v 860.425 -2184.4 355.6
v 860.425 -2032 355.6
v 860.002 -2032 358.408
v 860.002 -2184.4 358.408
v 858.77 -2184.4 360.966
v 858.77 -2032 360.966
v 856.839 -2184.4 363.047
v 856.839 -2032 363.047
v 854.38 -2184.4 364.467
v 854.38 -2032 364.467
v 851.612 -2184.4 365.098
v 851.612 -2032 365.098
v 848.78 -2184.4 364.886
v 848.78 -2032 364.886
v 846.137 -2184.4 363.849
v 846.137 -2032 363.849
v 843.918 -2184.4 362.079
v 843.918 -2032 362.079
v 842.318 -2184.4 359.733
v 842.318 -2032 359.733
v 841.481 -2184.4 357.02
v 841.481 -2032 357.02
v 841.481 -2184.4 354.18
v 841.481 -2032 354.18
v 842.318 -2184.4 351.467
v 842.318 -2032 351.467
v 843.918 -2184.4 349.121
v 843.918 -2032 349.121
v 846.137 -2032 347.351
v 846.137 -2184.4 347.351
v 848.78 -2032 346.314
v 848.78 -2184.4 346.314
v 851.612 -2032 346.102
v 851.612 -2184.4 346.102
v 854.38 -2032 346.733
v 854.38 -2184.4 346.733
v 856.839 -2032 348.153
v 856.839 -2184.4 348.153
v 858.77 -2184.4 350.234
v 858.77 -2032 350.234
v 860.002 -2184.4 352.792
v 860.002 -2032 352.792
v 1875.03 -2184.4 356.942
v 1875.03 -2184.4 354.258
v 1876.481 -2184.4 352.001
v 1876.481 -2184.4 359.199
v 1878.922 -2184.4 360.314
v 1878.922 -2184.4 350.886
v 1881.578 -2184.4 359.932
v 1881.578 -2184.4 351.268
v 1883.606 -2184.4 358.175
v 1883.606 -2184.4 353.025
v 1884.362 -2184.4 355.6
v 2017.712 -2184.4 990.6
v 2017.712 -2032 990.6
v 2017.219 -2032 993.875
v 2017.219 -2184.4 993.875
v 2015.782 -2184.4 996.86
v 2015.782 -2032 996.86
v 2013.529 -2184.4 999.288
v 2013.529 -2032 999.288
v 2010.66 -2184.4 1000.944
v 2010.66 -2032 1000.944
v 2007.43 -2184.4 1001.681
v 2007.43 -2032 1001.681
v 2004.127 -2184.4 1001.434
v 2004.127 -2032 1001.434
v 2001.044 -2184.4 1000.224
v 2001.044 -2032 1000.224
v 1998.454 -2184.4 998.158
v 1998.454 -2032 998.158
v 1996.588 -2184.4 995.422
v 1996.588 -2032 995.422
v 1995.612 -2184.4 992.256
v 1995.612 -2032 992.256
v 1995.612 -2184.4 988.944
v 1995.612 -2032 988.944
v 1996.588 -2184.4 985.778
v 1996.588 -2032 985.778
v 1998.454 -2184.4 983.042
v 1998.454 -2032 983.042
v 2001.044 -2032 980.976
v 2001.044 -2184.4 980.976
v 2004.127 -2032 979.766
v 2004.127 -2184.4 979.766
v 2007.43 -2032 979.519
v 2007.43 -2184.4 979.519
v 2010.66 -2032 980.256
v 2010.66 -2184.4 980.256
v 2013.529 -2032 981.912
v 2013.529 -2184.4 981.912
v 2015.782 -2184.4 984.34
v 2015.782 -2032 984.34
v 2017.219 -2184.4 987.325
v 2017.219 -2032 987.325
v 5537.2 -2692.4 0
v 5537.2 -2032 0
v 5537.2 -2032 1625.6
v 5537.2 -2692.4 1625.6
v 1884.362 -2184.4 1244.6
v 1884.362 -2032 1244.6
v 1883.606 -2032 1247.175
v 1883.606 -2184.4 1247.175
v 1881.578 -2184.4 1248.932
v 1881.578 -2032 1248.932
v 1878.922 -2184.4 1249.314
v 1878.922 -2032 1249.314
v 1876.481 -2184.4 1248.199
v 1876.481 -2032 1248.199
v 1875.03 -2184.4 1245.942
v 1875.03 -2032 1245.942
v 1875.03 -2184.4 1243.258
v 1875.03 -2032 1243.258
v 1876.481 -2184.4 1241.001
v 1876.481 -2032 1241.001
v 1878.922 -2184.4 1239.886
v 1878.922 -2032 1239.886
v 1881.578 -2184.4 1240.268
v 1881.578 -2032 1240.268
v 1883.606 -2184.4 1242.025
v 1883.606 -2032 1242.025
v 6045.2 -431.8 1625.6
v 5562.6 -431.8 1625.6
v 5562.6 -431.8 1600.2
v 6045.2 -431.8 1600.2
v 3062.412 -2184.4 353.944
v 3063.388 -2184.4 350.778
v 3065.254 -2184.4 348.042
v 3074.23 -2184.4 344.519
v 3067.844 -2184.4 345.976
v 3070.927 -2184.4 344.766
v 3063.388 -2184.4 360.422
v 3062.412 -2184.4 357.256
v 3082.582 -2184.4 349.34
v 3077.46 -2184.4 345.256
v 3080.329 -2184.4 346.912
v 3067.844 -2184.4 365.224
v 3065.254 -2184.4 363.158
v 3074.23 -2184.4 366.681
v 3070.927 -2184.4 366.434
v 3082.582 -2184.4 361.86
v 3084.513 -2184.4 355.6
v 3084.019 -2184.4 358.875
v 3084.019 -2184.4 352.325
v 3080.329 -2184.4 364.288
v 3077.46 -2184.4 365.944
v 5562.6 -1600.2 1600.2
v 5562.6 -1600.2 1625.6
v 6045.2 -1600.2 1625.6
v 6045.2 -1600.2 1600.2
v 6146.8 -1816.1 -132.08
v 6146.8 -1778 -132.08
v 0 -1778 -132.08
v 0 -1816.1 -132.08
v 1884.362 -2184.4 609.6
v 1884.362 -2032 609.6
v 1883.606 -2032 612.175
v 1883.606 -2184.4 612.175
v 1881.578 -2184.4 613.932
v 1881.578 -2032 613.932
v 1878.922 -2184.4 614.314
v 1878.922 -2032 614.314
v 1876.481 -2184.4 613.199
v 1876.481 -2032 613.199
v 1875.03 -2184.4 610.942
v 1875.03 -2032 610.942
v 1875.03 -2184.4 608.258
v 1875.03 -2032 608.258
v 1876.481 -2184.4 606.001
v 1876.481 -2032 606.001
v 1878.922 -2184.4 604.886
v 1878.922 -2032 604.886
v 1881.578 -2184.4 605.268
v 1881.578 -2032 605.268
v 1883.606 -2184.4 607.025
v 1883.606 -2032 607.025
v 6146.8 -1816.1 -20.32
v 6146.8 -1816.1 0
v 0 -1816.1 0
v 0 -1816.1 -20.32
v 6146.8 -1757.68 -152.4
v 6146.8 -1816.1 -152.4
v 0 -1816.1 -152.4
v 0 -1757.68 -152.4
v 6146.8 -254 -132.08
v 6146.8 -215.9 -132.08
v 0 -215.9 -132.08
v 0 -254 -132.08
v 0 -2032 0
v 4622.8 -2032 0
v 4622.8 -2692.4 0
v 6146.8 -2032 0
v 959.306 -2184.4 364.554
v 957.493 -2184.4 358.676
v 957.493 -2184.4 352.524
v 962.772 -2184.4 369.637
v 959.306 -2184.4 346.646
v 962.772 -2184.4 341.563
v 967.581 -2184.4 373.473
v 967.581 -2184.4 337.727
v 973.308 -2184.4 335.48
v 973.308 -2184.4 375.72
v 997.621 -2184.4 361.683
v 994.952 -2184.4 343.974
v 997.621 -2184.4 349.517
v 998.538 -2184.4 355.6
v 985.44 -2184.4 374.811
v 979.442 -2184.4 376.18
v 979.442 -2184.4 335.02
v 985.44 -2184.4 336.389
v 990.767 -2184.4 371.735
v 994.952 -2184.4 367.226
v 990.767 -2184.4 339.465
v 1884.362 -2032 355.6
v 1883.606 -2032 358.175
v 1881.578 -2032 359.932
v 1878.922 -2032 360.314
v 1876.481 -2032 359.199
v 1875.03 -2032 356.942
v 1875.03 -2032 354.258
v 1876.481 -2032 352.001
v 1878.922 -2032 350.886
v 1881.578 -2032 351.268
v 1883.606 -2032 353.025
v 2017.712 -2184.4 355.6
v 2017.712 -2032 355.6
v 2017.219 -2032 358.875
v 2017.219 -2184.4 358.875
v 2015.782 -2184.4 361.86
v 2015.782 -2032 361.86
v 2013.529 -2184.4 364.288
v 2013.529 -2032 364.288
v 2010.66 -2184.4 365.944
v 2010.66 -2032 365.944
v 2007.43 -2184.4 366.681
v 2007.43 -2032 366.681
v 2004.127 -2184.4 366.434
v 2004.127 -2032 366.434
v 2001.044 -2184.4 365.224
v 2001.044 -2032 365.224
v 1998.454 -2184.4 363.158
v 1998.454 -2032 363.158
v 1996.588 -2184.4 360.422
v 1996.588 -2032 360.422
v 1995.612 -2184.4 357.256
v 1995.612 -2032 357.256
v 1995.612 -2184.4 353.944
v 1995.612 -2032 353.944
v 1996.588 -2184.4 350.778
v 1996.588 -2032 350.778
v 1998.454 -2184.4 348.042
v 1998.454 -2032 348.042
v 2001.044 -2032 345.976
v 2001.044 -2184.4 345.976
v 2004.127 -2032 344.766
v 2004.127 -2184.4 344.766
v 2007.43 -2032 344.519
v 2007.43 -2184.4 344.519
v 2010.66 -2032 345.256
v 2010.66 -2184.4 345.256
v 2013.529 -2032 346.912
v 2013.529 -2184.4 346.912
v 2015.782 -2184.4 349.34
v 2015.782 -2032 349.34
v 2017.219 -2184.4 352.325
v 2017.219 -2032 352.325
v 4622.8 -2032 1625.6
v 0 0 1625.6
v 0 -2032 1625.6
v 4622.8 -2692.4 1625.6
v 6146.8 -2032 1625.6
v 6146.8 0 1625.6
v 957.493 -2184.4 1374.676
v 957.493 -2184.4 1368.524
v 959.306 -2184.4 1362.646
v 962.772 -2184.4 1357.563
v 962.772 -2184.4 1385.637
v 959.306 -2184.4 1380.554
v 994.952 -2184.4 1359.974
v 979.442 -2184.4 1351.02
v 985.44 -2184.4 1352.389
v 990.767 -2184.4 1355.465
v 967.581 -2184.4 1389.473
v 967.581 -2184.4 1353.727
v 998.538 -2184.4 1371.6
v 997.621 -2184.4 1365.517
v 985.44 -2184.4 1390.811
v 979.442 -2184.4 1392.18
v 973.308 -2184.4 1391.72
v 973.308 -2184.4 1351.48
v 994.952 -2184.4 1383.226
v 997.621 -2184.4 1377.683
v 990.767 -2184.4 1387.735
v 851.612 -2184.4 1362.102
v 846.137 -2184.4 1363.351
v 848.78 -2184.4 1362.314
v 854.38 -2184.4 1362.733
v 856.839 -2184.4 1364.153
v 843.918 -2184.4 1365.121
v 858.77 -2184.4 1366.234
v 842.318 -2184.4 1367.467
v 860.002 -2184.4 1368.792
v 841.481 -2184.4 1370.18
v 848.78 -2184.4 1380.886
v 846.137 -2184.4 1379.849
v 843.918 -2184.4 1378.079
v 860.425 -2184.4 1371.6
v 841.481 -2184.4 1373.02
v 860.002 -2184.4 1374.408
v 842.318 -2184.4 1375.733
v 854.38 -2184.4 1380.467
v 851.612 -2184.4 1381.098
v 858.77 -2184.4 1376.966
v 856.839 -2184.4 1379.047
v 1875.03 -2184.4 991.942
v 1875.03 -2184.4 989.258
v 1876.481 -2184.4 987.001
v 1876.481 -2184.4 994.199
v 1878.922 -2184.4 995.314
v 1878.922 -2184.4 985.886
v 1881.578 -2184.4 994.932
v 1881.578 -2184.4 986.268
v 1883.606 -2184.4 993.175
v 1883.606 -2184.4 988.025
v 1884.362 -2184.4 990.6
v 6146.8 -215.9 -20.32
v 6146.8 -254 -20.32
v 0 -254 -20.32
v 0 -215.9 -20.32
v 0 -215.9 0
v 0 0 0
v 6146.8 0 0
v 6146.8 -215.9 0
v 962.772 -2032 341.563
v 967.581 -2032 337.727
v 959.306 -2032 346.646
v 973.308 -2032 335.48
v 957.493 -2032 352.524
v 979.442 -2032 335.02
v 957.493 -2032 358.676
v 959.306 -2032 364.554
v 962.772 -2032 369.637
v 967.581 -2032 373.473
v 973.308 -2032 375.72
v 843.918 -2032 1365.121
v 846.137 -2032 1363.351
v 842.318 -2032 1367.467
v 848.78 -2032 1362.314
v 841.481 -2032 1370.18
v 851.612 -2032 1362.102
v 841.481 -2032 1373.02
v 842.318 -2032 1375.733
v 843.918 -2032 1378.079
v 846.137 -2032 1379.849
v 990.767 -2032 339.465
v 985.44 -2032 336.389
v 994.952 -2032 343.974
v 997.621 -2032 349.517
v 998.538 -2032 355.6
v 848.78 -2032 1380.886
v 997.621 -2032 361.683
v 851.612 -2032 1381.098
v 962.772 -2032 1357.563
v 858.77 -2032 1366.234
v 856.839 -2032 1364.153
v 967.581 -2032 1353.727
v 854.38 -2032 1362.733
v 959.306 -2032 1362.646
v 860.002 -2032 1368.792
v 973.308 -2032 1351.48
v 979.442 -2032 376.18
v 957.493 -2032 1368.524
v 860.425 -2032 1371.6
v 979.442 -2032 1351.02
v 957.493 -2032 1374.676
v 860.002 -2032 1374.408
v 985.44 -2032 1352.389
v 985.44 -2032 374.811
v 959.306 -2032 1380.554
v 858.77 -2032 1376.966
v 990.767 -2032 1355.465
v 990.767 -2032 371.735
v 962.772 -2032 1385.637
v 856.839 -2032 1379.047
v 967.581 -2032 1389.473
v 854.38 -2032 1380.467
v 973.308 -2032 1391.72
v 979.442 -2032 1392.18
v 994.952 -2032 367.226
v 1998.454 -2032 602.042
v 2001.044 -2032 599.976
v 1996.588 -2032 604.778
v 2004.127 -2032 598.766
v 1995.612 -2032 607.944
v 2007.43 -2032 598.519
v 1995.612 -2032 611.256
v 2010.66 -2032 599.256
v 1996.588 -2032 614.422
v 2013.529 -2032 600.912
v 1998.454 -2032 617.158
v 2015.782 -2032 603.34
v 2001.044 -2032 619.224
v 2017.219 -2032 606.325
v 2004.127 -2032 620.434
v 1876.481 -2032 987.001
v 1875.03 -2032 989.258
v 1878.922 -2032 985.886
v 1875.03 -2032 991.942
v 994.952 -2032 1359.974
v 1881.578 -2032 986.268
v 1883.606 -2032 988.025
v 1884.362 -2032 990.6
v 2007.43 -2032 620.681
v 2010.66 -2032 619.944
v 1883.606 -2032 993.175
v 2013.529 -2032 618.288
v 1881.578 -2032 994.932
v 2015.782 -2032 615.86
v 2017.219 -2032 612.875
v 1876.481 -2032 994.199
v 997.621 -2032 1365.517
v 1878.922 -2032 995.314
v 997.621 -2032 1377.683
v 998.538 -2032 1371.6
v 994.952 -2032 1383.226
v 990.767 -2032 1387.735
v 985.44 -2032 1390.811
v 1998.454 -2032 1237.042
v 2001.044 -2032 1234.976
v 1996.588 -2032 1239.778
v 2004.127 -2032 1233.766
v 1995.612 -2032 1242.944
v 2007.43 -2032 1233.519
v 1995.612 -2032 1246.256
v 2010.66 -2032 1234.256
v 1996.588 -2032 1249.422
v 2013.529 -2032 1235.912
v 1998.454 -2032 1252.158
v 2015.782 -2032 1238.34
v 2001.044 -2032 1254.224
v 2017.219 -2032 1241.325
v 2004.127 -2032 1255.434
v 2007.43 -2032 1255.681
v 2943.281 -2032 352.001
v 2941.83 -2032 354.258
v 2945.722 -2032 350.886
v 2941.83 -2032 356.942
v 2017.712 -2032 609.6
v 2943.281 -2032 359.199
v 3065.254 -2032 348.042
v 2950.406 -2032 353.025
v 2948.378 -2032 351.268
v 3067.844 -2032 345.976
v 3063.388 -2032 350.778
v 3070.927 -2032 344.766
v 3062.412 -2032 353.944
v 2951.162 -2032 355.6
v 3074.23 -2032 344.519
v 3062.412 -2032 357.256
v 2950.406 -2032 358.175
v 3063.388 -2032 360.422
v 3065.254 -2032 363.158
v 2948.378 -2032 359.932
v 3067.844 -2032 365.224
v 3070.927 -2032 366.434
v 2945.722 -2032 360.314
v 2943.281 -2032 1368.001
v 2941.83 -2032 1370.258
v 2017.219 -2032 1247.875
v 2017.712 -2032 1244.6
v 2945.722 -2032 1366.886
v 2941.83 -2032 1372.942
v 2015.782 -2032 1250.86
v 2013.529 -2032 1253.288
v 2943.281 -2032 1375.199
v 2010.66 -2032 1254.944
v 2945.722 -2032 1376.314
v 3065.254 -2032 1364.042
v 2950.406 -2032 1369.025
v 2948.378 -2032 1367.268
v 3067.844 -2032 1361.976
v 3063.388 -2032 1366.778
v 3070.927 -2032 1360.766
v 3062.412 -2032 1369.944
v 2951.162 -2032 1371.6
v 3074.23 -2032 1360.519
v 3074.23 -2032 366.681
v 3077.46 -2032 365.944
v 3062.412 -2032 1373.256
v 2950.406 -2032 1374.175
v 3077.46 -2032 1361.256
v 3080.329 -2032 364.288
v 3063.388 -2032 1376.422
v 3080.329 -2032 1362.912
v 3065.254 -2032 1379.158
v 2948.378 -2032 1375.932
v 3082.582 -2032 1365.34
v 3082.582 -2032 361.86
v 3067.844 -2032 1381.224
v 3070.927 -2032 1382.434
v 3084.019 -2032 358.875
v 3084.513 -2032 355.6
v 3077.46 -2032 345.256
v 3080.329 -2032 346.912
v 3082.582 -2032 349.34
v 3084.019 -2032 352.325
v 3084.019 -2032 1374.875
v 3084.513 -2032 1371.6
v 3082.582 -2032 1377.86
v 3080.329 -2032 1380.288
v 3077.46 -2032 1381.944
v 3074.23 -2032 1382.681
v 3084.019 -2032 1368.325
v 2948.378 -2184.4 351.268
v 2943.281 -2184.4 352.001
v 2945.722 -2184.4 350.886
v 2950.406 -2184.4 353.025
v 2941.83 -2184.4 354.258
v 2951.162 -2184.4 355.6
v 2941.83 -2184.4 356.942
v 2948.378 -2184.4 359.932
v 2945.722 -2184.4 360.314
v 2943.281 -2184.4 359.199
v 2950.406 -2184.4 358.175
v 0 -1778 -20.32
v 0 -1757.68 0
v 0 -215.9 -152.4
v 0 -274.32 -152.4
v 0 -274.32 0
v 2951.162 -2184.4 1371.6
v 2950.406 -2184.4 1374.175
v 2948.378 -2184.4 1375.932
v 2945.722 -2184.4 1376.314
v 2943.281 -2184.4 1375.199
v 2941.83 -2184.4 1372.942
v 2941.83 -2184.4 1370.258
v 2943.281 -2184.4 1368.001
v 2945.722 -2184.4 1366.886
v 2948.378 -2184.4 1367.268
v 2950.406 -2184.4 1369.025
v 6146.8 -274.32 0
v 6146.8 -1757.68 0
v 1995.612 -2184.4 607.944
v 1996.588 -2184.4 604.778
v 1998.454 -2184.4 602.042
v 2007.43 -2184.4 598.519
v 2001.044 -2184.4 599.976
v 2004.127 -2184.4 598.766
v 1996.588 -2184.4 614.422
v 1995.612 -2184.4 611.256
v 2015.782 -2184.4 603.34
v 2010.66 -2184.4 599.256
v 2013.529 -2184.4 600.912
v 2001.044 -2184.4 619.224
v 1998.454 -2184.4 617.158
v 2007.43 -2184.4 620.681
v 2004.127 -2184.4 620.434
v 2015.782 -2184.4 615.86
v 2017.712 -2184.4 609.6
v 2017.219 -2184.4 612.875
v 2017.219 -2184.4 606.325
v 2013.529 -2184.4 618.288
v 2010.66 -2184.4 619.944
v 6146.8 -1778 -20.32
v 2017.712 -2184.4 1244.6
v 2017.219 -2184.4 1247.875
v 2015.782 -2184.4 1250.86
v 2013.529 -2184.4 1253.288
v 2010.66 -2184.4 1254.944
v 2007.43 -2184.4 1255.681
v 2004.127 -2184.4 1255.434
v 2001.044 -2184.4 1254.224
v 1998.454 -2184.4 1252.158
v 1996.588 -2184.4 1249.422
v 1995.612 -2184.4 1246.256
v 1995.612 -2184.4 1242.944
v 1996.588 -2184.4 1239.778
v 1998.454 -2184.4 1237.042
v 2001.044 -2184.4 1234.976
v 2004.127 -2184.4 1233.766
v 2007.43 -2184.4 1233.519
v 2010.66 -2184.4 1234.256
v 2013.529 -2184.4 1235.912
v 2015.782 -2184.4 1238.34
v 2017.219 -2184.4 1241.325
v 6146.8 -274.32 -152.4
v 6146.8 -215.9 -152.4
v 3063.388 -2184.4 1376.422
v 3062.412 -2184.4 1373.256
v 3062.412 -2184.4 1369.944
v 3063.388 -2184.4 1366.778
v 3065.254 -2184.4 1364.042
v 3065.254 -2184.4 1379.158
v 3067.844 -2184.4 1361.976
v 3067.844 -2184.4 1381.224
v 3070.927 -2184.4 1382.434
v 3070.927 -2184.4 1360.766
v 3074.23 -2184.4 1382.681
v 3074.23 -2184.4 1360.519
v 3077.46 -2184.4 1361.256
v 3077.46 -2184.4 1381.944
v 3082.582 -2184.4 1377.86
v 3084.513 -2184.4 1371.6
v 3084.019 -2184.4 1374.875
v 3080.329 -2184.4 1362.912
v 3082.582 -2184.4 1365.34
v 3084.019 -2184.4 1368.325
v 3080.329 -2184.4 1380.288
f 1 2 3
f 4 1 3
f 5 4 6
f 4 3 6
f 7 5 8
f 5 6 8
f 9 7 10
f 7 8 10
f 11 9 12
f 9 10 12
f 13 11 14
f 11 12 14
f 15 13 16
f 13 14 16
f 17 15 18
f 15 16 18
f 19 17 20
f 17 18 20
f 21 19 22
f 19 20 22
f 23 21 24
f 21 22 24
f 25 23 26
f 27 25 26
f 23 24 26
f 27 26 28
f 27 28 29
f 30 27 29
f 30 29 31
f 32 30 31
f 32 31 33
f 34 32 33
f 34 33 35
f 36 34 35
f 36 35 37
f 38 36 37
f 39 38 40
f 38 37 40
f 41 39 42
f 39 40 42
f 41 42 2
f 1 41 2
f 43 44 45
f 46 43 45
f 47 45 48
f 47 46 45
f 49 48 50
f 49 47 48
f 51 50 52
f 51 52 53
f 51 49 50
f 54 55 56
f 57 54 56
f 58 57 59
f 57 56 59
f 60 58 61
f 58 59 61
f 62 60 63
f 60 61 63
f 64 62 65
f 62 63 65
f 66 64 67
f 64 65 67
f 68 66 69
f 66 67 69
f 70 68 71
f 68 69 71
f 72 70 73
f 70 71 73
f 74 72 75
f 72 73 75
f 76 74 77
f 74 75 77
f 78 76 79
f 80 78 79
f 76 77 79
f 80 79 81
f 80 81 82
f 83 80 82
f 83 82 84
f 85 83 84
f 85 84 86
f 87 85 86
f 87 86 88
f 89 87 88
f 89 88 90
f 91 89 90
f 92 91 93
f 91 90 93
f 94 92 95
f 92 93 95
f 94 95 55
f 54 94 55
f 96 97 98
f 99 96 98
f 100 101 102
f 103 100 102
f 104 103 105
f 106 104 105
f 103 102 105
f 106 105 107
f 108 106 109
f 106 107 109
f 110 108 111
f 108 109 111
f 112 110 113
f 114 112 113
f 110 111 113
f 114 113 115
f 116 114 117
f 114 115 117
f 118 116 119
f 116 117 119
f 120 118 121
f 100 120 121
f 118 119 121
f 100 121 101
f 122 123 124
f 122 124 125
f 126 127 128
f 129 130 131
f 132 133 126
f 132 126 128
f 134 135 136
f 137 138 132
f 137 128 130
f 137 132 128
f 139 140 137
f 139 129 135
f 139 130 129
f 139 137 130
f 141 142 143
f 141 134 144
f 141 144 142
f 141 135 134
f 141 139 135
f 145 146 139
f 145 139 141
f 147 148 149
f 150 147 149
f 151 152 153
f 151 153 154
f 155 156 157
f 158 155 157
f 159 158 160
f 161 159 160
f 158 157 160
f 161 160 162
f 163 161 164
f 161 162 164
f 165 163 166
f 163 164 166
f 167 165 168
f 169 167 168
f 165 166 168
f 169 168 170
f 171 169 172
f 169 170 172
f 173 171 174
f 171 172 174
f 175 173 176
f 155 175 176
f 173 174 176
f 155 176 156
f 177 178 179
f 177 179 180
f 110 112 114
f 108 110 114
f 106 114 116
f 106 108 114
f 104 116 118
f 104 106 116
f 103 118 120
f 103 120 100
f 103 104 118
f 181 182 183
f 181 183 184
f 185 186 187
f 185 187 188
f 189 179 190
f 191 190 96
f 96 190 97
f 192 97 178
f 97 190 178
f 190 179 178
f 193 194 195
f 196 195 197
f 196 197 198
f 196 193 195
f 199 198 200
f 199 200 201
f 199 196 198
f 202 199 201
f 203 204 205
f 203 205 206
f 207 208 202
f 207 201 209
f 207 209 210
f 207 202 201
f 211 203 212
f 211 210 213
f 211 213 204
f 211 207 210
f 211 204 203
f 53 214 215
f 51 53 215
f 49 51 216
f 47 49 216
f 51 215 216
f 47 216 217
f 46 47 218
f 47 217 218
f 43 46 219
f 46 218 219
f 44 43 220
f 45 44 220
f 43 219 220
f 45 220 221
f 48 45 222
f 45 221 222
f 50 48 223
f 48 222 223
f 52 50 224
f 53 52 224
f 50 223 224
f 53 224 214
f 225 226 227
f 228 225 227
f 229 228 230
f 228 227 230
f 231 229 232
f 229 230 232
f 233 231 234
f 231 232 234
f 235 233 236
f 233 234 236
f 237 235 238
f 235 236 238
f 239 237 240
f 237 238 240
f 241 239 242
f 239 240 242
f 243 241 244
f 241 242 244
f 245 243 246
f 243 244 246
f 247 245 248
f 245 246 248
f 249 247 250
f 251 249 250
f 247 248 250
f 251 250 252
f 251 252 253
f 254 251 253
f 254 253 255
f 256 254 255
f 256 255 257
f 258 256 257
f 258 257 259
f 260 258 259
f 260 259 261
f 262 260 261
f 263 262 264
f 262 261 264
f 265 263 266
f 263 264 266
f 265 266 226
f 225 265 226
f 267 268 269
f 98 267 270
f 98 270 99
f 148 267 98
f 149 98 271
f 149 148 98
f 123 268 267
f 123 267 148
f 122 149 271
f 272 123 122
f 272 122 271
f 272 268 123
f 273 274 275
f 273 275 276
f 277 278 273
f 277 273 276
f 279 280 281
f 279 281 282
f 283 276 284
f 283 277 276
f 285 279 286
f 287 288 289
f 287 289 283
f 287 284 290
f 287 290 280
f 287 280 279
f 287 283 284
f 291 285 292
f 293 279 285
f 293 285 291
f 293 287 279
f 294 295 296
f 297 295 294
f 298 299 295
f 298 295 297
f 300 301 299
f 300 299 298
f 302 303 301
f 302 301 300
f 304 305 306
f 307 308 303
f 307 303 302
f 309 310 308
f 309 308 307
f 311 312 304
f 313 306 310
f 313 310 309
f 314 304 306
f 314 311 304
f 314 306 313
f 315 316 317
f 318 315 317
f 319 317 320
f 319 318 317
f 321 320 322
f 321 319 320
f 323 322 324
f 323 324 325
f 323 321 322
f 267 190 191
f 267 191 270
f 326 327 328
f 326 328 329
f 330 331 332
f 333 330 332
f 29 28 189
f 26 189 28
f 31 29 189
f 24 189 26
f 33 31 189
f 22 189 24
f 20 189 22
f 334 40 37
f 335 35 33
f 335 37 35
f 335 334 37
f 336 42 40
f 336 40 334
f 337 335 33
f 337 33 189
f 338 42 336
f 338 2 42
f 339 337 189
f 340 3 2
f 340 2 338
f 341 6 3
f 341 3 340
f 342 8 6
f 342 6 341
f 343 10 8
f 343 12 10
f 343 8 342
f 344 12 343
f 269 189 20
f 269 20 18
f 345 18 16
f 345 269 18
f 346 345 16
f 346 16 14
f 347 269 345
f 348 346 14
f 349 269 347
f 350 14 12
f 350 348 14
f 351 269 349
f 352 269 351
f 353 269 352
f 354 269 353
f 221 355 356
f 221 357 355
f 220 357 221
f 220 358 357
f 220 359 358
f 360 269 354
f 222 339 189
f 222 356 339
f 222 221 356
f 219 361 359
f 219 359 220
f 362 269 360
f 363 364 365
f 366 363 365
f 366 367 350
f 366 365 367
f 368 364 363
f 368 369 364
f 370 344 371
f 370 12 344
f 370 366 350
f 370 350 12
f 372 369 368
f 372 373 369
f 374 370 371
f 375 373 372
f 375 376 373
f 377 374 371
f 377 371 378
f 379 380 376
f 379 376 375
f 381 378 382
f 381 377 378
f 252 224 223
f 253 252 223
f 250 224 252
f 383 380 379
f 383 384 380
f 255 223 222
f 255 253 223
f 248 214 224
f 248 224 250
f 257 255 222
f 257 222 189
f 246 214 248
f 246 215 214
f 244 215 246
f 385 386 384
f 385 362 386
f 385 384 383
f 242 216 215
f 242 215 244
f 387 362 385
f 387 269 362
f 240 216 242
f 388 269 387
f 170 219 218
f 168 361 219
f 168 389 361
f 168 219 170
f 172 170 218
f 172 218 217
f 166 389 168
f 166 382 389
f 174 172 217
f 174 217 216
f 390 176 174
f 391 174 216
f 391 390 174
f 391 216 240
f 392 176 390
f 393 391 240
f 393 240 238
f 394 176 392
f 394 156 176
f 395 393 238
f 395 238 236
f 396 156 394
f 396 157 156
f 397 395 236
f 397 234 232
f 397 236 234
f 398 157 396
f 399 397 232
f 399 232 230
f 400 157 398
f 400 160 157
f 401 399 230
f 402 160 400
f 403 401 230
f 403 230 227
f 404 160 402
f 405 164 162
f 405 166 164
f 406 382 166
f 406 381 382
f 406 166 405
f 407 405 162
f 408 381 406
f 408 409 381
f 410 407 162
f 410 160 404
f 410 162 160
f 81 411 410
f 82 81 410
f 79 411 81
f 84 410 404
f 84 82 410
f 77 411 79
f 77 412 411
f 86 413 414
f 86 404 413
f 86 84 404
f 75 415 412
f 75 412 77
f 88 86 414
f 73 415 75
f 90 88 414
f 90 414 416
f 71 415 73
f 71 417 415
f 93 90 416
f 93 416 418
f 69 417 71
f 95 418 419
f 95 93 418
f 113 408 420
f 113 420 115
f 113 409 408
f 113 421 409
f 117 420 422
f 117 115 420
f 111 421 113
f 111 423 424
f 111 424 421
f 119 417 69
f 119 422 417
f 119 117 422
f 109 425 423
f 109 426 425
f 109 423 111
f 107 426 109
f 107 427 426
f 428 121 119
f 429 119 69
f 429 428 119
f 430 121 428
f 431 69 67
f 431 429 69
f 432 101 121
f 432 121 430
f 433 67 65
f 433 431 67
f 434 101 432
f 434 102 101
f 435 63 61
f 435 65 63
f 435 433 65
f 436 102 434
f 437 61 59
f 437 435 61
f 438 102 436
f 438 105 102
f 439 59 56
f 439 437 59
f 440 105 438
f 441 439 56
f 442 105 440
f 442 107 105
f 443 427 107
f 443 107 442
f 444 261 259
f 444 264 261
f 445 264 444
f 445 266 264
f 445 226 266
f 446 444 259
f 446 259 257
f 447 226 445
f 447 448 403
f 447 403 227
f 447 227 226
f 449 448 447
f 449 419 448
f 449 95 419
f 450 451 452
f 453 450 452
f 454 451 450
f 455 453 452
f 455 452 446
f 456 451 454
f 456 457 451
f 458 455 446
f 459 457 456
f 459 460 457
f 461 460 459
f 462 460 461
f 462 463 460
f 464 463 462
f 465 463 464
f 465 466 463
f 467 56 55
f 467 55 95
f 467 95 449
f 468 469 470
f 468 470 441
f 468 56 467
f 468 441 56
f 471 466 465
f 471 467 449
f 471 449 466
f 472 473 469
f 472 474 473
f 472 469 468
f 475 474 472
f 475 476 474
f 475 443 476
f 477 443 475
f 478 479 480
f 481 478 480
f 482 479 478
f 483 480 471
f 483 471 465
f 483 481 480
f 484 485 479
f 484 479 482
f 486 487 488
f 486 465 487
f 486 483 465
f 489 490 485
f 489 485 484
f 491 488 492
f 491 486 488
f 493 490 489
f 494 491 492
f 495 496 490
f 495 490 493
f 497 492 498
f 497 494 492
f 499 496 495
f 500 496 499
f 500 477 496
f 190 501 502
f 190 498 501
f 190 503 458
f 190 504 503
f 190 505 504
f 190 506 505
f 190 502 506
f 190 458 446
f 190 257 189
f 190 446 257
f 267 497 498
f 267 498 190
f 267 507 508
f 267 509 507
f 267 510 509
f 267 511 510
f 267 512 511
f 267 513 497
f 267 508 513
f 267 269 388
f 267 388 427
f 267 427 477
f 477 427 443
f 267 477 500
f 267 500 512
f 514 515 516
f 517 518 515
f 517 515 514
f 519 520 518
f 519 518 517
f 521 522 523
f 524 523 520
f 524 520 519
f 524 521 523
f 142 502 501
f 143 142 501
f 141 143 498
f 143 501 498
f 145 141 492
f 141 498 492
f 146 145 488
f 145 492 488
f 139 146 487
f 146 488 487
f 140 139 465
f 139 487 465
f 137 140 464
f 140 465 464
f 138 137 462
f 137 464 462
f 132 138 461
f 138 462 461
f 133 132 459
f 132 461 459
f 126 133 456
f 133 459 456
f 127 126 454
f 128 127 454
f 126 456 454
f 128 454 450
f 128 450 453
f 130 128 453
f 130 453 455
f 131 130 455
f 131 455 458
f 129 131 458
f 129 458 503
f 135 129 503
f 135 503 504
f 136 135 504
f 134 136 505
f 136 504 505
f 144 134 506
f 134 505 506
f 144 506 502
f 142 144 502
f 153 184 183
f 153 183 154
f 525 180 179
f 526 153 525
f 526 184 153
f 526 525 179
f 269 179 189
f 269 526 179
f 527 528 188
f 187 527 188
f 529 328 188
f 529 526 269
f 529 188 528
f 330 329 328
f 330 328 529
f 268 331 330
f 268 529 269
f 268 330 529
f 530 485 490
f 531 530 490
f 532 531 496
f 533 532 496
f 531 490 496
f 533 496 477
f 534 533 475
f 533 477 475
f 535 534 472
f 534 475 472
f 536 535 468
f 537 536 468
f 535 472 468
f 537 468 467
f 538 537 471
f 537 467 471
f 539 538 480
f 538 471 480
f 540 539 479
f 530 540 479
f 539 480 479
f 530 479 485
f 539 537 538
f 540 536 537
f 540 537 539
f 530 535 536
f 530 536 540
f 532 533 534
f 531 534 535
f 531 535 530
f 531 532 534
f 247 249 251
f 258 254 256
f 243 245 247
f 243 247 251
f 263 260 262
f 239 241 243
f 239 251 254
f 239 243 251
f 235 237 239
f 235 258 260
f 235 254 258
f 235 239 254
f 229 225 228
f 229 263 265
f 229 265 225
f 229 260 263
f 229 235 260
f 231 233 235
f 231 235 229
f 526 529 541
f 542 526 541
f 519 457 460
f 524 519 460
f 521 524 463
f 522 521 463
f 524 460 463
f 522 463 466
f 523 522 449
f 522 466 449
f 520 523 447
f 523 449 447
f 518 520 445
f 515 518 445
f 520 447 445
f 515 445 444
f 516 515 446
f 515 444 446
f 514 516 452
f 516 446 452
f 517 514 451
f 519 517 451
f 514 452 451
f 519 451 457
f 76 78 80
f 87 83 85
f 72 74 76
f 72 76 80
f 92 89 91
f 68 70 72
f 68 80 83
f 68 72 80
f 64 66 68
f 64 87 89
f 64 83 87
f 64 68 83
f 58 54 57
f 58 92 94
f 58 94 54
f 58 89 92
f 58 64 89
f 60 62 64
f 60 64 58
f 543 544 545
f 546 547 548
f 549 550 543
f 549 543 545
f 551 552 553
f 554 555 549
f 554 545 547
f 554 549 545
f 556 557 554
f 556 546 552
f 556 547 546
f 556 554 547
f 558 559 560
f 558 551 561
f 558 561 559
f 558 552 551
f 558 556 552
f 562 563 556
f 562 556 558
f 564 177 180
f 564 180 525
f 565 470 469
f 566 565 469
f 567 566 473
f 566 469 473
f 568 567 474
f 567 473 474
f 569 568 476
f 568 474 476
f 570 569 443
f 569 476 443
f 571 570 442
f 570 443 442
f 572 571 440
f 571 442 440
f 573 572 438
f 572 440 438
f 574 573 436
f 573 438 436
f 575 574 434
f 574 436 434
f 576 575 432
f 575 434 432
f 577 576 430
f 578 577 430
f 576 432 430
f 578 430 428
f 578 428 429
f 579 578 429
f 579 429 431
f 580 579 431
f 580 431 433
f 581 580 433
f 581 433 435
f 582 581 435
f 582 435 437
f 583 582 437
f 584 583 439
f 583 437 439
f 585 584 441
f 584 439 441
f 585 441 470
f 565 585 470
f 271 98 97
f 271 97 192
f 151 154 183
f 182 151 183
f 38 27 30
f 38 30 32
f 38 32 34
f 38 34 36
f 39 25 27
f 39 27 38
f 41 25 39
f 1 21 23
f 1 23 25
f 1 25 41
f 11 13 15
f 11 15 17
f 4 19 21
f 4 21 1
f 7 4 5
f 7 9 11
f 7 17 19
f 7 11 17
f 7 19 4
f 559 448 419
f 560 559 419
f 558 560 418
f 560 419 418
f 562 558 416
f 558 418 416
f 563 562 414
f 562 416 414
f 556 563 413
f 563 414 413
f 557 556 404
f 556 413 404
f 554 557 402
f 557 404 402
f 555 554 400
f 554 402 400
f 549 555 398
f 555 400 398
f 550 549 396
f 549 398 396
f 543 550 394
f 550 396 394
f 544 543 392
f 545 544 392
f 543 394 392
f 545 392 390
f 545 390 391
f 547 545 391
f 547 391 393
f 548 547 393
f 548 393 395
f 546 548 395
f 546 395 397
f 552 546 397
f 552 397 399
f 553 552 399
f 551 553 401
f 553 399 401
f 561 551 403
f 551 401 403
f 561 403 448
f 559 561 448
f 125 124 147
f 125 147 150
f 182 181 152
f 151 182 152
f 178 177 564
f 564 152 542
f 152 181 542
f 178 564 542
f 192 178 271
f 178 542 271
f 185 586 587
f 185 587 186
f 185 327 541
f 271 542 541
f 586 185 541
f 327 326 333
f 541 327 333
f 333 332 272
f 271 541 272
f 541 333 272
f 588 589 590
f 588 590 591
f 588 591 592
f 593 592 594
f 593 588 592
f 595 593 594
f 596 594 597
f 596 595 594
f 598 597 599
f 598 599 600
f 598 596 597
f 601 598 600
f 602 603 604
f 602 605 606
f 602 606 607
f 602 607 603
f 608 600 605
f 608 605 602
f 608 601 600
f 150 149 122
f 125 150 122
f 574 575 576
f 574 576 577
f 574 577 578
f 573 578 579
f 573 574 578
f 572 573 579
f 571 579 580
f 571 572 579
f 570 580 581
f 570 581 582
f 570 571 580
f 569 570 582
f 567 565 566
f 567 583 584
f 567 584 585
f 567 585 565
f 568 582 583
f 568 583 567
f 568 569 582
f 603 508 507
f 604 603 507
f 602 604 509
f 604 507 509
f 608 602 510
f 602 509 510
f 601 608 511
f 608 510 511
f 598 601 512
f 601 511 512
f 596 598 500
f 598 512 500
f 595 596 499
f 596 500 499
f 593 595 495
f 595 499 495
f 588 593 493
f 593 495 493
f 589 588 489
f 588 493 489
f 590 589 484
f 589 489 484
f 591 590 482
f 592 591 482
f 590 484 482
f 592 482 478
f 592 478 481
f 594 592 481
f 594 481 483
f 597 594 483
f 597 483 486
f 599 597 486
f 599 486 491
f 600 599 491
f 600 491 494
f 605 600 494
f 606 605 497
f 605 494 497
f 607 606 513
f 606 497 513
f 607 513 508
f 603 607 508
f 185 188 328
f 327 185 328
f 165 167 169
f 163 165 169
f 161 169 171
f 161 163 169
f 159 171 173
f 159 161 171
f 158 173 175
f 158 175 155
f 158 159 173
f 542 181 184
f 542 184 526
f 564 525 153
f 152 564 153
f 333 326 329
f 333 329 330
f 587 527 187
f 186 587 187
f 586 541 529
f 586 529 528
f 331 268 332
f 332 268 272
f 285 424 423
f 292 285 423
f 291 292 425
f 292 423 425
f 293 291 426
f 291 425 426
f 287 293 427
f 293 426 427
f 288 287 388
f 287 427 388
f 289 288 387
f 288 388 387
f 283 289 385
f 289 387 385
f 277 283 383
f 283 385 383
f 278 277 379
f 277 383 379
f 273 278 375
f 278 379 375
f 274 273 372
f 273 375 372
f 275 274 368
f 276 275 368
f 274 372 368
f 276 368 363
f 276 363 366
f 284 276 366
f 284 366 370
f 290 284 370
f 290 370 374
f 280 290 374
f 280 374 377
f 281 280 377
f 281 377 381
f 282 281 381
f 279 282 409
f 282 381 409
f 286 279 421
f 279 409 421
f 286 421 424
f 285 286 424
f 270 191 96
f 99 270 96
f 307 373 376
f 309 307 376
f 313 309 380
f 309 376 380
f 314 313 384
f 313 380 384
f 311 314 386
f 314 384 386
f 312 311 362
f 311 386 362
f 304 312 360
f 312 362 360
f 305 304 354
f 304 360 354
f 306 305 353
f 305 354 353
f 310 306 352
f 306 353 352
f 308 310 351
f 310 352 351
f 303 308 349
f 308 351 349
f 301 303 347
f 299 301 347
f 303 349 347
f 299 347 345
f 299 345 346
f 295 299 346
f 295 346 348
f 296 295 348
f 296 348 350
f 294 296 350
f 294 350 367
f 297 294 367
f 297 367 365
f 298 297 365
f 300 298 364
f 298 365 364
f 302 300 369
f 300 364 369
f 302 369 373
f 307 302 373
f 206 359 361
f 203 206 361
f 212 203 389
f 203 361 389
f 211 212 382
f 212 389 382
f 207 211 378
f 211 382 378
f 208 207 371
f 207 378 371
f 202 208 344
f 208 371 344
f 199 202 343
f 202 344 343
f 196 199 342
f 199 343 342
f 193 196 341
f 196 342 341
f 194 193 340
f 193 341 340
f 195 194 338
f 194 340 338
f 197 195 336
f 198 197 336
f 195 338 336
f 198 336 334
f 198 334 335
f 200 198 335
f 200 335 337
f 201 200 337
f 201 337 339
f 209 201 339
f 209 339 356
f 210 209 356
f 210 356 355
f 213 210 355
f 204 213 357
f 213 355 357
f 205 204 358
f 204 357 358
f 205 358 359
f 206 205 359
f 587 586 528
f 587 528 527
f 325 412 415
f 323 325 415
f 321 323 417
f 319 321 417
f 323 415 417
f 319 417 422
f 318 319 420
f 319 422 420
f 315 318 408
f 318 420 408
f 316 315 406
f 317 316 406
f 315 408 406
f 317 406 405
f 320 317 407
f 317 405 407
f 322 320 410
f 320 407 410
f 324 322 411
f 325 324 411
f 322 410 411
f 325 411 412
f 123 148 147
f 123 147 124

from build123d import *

# Parameters (mm, degrees)
F0_W     = 6146.8
F0_H     = 1625.6
F1_DEPTH = 2032
F2_W     = 914.4
F2_H     = 1625.6
F3_DEPTH = 660.4
F4_W     = 482.6
F4_H     = 1168.4
F5_DEPTH = 25.4
F7_DEPTH = 6146.8
F8_R     = 9.525
F8_R_2   = 20.6375
F8_R_3   = 4.7625
F8_R_4   = 11.1125
F9_DEPTH = 152.4


with BuildPart() as f1:
    # F0 (on Front) → F1 (new body)
    with BuildSketch(Plane.XZ):
        with Locations((3073.4, 812.8)):
            Rectangle(F0_W, F0_H)
    extrude(amount=F1_DEPTH)

    # F2 (on face) → F3 (join)
    with BuildSketch(Plane.XZ.offset(2032)):
        with Locations((5080, 812.8)):
            Rectangle(F2_W, F2_H)
    extrude(amount=F3_DEPTH)

    # F4 (on face) → F5 (cut)
    with BuildSketch(Plane.XY.offset(1625.6)):
        with Locations((5803.9, -1016)):
            Rectangle(F4_W, F4_H)
    extrude(amount=-F5_DEPTH, mode=Mode.SUBTRACT)

    # F6 (on face) → F7 (join, through all)
    with BuildSketch(Plane.YZ.offset(6146.8)):
        Polygon((-1757.68, 0), (-1816.1, 0), (-1816.1, -20.32), (-1778, -20.32), (-1778, -132.08), (-1816.1, -132.08), (-1816.1, -152.4), (-1757.68, -152.4), align=None)
        Polygon((-215.9, -152.4), (-215.9, -132.08), (-254, -132.08), (-254, -20.32), (-215.9, -20.32), (-215.9, 0), (-274.32, 0), (-274.32, -152.4), align=None)
    extrude(amount=-F7_DEPTH)

    # F8 (on face) → F9 (join)
    with BuildSketch(Plane.XZ.offset(2032)):
        with Locations((850.9, 1371.6)):
            Circle(F8_R)
        with Locations((850.9, 355.6)):
            Circle(F8_R)
        with Locations((977.9, 1371.6)):
            Circle(F8_R_2)
        with Locations((977.9, 355.6)):
            Circle(F8_R_2)
        with Locations((2946.4, 1371.6)):
            Circle(F8_R_3)
        with Locations((3073.4, 1371.6)):
            Circle(F8_R_4)
        with Locations((2946.4, 355.6)):
            Circle(F8_R_3)
        with Locations((3073.4, 355.6)):
            Circle(F8_R_4)
        with Locations((1879.6, 1244.6)):
            Circle(F8_R_3)
        with Locations((2006.6, 1244.6)):
            Circle(F8_R_4)
        with Locations((1879.6, 990.6)):
            Circle(F8_R_3)
        with Locations((2006.6, 990.6)):
            Circle(F8_R_4)
        with Locations((1879.6, 609.6)):
            Circle(F8_R_3)
        with Locations((2006.6, 609.6)):
            Circle(F8_R_4)
        with Locations((1879.6, 355.6)):
            Circle(F8_R_3)
        with Locations((2006.6, 355.6)):
            Circle(F8_R_4)
    extrude(amount=F9_DEPTH)


solid = f1.part
